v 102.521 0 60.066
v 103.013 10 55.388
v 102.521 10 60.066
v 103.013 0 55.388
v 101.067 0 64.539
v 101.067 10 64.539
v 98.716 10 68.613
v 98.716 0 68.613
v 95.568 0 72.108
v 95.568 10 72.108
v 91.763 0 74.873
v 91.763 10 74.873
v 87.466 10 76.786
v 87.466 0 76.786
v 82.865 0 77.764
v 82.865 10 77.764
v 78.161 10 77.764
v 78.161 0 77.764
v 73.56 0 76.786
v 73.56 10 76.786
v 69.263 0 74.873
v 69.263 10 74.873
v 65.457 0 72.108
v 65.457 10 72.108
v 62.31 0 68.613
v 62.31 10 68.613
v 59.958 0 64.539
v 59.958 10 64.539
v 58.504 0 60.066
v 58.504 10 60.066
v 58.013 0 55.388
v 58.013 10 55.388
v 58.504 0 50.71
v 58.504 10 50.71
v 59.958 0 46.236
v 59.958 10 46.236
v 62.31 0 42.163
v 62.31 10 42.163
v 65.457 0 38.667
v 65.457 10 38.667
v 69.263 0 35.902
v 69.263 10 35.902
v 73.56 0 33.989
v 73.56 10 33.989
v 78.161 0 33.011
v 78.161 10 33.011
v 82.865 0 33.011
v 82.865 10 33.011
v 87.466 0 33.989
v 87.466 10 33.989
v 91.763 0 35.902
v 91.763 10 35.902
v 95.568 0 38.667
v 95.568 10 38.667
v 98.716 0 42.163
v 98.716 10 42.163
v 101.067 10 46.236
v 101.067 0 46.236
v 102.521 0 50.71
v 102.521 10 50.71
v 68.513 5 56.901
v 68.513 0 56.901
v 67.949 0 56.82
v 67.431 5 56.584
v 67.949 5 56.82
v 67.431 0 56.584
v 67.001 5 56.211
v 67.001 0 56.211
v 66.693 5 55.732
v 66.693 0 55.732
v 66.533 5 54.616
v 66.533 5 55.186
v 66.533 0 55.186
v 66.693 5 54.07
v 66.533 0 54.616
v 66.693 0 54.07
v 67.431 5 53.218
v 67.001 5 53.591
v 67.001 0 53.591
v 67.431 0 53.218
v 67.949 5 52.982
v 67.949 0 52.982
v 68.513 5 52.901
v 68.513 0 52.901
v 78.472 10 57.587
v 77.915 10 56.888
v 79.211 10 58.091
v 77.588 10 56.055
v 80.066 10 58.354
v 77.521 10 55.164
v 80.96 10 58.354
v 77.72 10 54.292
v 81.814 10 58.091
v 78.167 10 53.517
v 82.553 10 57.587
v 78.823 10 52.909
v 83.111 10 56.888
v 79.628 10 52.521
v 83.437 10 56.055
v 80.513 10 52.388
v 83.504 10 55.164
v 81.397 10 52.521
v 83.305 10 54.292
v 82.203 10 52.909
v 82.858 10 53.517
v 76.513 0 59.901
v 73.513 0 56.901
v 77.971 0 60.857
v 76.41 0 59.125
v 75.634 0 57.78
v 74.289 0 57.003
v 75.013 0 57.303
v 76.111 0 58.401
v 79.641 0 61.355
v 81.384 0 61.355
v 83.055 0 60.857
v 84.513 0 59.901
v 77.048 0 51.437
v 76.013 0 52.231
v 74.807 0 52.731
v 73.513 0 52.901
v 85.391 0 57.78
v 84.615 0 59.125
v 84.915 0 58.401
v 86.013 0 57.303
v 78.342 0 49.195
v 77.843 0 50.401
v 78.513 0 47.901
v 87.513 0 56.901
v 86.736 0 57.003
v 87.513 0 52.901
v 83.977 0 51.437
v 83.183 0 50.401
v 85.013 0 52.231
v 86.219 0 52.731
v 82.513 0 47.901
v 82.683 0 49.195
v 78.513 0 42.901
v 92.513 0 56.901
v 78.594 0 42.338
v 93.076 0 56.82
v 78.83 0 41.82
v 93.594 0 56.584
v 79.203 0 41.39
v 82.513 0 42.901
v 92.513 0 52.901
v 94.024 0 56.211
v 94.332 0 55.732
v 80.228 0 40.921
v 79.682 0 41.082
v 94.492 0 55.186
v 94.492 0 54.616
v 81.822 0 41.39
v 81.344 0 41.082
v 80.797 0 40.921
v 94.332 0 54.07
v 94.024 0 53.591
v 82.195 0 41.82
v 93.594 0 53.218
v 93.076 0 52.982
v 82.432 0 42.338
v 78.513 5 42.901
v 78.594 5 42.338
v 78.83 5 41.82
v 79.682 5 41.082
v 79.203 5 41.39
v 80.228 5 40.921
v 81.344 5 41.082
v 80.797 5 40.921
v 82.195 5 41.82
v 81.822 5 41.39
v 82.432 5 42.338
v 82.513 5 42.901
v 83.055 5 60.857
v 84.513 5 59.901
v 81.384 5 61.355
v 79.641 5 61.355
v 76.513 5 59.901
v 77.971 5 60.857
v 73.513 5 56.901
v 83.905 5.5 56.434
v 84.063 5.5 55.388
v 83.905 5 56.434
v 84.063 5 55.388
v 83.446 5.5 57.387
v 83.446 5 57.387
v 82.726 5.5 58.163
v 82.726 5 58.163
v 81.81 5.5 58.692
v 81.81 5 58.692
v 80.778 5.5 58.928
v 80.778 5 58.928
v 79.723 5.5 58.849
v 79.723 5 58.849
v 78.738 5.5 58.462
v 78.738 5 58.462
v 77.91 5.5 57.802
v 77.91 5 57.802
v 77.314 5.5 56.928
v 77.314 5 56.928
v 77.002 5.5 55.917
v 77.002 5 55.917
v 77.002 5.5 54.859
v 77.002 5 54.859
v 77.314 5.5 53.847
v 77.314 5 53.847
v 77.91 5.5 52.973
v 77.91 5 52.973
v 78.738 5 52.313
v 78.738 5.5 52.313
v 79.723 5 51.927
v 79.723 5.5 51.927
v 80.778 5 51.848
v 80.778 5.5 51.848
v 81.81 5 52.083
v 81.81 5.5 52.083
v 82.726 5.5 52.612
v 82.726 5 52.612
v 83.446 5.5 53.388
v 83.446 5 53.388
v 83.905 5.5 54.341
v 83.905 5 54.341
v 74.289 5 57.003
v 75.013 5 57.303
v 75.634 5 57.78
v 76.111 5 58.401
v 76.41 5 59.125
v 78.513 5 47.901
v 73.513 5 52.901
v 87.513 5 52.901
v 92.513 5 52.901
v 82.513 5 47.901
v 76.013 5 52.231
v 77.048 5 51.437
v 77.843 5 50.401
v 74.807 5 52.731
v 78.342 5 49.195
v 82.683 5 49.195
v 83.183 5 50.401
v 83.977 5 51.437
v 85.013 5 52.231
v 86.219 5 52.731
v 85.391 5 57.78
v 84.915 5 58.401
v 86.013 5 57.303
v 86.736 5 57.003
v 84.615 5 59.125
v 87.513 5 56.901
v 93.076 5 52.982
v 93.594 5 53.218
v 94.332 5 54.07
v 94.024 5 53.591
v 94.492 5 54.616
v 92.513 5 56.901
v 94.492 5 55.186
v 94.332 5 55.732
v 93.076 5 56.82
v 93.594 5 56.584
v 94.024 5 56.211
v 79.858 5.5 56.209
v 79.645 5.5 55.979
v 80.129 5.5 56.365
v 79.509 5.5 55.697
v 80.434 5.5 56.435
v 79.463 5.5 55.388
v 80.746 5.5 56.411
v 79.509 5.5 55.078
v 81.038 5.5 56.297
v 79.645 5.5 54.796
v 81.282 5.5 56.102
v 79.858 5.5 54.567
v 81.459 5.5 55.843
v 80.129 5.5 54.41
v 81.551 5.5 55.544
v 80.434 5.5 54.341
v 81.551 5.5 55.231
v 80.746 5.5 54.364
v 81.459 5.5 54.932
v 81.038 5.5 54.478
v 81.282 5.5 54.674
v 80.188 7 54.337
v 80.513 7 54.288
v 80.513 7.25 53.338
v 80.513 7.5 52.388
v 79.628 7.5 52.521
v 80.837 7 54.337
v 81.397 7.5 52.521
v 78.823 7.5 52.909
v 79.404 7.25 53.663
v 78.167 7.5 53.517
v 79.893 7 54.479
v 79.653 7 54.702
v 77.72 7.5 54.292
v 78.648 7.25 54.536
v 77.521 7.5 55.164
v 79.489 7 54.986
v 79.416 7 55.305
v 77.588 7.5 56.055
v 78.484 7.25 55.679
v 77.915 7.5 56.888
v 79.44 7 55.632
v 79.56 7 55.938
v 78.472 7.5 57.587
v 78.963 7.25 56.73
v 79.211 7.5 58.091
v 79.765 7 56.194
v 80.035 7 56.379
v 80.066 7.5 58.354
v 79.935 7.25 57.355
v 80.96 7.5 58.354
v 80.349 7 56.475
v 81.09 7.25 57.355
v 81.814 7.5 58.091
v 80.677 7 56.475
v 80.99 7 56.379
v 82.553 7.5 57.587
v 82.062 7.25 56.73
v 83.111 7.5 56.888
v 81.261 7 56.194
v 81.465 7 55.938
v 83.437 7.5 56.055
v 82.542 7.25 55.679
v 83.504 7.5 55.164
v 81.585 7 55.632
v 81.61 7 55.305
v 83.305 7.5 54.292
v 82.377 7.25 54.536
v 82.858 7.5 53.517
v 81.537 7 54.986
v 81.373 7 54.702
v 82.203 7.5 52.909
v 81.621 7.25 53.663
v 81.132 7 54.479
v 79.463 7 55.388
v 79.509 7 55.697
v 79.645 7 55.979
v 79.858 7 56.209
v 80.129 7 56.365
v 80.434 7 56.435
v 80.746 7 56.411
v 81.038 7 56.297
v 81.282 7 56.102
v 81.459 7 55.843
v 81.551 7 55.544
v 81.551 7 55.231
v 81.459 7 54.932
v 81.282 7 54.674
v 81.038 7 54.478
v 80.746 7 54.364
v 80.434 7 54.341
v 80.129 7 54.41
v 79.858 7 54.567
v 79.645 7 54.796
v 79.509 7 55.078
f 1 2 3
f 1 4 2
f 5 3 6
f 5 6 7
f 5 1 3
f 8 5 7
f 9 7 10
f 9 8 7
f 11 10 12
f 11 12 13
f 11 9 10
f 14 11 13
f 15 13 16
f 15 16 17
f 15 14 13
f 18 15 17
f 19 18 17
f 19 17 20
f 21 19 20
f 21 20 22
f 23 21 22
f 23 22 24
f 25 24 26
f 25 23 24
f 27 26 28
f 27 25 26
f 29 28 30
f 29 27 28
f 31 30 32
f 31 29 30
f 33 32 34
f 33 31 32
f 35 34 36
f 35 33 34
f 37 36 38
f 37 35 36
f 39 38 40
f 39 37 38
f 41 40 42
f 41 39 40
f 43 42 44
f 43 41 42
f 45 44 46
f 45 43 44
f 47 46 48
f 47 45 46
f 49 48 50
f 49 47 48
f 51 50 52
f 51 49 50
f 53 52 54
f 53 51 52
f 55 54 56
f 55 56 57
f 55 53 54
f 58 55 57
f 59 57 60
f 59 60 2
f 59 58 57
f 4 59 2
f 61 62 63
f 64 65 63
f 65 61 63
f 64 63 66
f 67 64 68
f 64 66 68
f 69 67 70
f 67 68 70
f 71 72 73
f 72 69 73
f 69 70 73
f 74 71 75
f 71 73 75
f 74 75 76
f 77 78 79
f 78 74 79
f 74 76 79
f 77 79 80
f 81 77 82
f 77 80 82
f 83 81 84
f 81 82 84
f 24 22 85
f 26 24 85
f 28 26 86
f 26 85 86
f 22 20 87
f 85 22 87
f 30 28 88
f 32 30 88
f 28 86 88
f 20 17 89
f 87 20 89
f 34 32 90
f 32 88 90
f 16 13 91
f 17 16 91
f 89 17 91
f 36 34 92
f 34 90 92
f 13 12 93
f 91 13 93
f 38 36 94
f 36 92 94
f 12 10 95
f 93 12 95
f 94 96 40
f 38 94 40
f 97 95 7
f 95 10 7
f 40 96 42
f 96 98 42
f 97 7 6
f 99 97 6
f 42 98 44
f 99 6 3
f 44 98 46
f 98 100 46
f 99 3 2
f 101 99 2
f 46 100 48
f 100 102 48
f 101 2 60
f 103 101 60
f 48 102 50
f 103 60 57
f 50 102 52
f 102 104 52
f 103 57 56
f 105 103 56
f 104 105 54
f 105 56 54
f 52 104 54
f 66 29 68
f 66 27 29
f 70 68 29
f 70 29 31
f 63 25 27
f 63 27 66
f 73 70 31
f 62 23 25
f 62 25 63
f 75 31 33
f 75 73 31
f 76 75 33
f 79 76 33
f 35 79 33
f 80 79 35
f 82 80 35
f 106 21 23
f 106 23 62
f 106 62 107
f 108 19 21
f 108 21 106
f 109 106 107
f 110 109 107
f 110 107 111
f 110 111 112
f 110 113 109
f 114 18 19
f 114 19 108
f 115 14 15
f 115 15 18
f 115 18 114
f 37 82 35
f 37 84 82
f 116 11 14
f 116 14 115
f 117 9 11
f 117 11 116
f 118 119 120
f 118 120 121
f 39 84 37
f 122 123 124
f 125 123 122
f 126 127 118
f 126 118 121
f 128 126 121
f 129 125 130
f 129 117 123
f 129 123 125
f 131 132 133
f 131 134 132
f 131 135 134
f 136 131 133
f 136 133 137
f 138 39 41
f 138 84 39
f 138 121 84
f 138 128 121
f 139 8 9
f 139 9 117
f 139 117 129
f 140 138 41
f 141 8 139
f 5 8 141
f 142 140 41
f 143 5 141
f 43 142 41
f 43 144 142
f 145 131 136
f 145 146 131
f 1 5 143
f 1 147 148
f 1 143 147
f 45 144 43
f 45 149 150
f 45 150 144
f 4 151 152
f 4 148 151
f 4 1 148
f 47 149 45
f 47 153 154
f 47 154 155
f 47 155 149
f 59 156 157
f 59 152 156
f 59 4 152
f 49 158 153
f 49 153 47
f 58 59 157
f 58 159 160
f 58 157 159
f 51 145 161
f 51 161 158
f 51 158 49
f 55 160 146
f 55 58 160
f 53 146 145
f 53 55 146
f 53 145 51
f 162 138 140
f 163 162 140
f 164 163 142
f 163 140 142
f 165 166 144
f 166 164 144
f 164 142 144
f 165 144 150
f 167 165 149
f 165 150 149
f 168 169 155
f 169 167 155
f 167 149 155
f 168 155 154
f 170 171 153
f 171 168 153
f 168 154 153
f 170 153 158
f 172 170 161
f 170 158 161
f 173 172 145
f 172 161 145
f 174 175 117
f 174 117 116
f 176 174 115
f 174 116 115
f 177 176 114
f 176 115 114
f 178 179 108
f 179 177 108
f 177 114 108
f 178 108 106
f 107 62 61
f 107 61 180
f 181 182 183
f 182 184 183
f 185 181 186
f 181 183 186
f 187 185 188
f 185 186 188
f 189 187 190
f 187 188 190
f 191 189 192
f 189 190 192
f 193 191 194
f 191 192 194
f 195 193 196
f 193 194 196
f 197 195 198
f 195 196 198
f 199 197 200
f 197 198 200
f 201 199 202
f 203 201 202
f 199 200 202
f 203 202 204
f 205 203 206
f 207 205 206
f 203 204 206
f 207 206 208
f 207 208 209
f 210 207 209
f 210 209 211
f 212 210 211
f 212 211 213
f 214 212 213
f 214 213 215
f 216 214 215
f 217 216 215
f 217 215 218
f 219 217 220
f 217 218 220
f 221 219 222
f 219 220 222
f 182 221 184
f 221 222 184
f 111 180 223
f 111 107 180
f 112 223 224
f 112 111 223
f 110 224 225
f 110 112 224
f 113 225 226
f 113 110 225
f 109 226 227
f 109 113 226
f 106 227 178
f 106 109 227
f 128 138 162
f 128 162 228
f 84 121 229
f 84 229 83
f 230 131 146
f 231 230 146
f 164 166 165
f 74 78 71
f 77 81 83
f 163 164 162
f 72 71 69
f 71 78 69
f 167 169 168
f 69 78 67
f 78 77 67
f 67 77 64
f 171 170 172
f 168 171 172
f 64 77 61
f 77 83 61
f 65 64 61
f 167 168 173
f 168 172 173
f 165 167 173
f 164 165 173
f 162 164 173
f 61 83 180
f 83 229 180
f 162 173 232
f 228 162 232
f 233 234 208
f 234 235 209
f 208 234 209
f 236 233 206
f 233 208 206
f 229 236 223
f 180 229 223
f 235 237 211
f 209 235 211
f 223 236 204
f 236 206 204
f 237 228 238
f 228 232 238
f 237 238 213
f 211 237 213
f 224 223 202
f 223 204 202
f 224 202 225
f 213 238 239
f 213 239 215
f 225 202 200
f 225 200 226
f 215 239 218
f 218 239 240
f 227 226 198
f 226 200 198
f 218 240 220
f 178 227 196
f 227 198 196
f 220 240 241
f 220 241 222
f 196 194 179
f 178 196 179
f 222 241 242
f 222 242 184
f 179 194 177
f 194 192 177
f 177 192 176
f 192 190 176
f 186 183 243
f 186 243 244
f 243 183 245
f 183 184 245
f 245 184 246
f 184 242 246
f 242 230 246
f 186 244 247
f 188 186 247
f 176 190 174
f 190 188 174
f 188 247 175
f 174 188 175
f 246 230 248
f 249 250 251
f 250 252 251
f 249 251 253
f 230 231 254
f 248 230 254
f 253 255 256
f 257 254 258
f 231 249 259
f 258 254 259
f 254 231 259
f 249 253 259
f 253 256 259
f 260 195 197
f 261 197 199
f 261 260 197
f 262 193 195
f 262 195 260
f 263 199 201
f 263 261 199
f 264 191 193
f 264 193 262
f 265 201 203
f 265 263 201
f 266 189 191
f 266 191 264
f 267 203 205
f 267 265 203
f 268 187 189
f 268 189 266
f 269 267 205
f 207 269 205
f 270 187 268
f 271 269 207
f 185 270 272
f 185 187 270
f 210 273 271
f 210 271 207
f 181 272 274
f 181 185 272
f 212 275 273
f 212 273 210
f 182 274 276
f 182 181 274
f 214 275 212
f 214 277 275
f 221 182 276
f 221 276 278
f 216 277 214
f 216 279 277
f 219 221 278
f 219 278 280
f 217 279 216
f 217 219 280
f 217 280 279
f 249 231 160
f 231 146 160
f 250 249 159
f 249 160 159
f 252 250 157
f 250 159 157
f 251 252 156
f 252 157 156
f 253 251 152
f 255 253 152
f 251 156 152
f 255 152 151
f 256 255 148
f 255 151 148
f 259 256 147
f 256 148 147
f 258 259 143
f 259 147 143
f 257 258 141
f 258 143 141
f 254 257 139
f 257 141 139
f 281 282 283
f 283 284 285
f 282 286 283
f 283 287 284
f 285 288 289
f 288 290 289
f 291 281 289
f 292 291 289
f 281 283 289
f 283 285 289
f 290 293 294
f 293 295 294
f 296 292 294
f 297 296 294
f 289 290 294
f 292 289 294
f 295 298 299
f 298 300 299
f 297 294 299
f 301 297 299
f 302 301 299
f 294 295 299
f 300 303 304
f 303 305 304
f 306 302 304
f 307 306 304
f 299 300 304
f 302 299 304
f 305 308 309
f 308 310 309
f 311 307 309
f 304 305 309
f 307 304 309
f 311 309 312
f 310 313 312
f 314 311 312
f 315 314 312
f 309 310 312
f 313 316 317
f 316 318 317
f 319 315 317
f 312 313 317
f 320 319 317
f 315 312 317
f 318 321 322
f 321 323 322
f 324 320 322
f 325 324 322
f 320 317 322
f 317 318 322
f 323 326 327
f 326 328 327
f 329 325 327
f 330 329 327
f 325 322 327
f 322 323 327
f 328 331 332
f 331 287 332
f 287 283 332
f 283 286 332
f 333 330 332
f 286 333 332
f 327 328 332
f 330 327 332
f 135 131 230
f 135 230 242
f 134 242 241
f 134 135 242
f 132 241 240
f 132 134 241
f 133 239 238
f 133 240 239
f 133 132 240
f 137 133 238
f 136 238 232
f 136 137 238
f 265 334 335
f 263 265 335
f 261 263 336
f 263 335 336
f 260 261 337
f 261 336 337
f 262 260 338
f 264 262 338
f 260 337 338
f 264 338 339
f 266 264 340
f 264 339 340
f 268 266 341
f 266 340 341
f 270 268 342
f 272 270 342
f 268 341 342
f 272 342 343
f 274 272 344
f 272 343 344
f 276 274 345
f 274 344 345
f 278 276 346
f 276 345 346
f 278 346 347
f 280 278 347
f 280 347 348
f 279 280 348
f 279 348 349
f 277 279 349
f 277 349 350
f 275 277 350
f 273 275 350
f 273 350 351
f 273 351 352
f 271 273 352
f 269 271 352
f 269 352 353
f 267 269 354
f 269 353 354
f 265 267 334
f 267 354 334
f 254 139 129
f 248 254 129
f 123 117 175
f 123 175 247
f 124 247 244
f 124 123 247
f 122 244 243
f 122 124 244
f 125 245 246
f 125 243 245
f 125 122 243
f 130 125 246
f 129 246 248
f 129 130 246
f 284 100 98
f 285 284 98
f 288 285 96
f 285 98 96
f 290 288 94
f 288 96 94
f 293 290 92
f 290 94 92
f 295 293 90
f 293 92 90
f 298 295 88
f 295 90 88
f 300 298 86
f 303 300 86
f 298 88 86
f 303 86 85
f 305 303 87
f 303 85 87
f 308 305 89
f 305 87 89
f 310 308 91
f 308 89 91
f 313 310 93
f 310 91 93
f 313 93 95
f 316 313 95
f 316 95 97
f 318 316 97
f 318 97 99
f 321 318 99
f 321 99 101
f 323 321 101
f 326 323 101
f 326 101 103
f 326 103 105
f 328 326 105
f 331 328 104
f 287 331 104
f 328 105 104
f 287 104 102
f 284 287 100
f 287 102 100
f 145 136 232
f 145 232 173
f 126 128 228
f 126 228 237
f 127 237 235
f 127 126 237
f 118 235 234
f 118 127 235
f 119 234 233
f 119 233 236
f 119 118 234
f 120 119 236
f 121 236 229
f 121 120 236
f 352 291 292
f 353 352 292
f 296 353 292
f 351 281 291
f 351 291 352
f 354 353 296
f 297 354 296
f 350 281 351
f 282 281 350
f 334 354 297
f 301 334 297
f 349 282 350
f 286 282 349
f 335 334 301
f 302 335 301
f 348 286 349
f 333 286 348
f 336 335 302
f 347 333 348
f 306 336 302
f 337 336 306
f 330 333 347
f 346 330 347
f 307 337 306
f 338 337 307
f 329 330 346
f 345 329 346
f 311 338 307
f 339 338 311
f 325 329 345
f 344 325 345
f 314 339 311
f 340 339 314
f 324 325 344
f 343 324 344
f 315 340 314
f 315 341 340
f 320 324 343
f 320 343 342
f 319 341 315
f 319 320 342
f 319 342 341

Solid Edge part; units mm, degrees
sketch "Sketch1" plane through (0, 0, 0) normal (0, -1, 0) x (1, 0, 0)
  circle A0 centre (80.5127, 55.3877) radius 22.5
  dimension "D1" = 45
extrude "ExtrudedProtrusion_1" add sketch "Sketch1" against normal blind 10
sketch "Sketch2" plane through (63.9305, 0, 41.9251) normal (0, -1, 0) x (1, 0, 0)
  line L0 (18.5822, 5.9759) -> (18.5822, 0.9759)
  arc A0 (18.5822, 0.9759) -> (14.5822, 0.9759) centre (16.5822, 0.9759) cw
  line L1 (14.5822, 0.9759) -> (14.5822, 5.9759)
  arc A1 (14.5822, 5.9759) -> (9.5822, 10.9759) centre (9.5822, 5.9759) ccw
  line L2 (9.5822, 10.9759) -> (4.5822, 10.9759)
  arc A2 (4.5822, 10.9759) -> (4.5822, 14.9759) centre (4.5822, 12.9759) cw
  line L3 (4.5822, 14.9759) -> (9.5822, 14.9759)
  arc A3 (9.5822, 14.9759) -> (12.5822, 17.9759) centre (9.5822, 17.9759) ccw
  arc A4 (12.5822, 17.9759) -> (20.5822, 17.9759) centre (16.5822, 13.4626) cw
  arc A5 (23.5822, 14.9759) -> (20.5822, 17.9759) centre (23.5822, 17.9759) cw
  line L4 (28.5822, 14.9759) -> (23.5822, 14.9759)
  arc A6 (28.5822, 10.9759) -> (28.5822, 14.9759) centre (28.5822, 12.9759) ccw
  line L5 (23.5822, 10.9759) -> (28.5822, 10.9759)
  arc A7 (18.5822, 5.9759) -> (23.5822, 10.9759) centre (23.5822, 5.9759) cw
  dimension "D1" = 5
  dimension "D2" = 2
  dimension "D3" = 5
  dimension "D4" = 5
  dimension "D5" = 5
  dimension "D6" = 2
  dimension "D7" = 5
  dimension "D8" = 5
  dimension "D9" = 2
  dimension "D10" = 5
  dimension "D11" = 5
  dimension "D12" = 3
  dimension "D13" = 3
extrude "Cutout1" cut sketch "Sketch2" against normal blind 5
sketch "Sketch3" plane through (80.5127, 10, 55.3877) normal (0, 1, 0) x (0, 0, -1)
  circle A0 centre (0, 0) radius 3
extrude "ExtrudedCutout_5" cut sketch "Sketch3" against normal blind 3
sketch "Sketch4" plane through (80.5127, 7, 55.3877) normal (0, 1, 0) x (-1, 0, 0)
  circle A0 centre (0, 0) radius 1.05
  dimension "D1" = 2.1
extrude "Cutout2" cut sketch "Sketch4" against normal up to next
sketch "Sketch5" plane through (80.5127, 5, 51.1598) normal (0, -1, 0) x (1, 0, 0)
  circle A0 centre (0, 4.2279) radius 3.55
extrude "ExtrudedCutout_7" cut sketch "Sketch5" against normal blind 0.5
chamfer "Chamfer_2" distance 1.9 distance2 0.5 1 edges at (80.5127, 7, 58.3877) measured on face at (78.5727, 7, 53.3277)
